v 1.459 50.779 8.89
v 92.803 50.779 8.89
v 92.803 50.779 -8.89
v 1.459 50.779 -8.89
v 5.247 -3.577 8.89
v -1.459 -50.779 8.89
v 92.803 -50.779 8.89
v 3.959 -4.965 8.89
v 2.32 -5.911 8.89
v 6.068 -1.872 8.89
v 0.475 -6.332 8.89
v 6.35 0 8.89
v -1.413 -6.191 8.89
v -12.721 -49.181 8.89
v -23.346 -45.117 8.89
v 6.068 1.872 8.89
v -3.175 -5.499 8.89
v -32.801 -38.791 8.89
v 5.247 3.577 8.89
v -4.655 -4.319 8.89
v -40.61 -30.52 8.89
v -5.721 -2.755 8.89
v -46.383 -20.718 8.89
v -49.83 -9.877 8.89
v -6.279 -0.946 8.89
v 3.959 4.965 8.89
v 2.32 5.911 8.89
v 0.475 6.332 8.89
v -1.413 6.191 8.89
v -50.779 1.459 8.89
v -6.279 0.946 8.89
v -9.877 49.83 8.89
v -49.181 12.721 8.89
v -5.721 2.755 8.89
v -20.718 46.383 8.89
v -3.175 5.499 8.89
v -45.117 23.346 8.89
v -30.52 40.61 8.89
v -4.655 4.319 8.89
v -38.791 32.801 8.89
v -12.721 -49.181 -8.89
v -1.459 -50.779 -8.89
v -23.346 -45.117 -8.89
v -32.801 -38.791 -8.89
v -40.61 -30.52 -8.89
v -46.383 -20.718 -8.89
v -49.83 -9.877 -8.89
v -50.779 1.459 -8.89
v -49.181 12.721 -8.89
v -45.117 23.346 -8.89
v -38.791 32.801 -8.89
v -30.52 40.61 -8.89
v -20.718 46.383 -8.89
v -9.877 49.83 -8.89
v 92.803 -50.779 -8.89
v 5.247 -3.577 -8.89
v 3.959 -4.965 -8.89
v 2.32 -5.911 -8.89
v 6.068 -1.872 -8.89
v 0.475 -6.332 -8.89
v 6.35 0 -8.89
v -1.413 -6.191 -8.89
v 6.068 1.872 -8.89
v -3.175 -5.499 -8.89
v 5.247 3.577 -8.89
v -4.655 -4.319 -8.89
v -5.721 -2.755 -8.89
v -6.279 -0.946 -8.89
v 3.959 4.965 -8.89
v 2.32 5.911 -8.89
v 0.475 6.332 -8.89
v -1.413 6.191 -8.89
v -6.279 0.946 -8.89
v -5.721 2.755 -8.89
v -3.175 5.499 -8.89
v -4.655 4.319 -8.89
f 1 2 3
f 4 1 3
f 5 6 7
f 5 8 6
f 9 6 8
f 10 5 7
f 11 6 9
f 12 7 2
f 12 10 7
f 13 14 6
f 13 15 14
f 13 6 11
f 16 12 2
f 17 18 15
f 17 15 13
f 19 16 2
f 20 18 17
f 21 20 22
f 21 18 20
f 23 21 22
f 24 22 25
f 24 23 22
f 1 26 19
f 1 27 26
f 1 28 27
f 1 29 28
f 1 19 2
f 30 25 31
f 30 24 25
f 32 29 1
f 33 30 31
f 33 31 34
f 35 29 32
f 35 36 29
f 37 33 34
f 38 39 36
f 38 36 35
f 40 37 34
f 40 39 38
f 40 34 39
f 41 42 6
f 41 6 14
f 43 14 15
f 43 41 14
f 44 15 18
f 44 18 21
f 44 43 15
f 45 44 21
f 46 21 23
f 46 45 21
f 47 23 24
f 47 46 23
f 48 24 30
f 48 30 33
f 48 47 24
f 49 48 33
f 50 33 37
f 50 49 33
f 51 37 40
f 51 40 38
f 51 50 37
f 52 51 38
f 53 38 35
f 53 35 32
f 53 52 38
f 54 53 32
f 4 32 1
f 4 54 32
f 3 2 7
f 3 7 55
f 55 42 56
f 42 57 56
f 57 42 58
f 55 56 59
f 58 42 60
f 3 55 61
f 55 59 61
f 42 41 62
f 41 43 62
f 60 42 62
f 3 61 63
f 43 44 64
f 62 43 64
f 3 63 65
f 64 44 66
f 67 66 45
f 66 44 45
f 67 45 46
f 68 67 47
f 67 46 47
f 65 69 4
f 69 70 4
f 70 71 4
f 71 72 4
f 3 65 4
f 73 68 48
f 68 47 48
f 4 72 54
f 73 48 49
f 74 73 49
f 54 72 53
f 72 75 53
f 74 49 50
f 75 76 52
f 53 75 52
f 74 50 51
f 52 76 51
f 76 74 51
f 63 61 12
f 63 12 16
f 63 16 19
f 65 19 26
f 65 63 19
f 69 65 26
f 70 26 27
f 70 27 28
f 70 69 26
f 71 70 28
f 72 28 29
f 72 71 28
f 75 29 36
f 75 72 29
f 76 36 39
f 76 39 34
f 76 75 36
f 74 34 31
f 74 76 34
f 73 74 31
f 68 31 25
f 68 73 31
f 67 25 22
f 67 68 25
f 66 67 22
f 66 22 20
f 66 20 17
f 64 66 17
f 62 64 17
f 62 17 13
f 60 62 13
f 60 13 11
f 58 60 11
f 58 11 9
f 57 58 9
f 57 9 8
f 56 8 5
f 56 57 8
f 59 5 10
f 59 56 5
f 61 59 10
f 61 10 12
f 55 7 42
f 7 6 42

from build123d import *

# Parameters (mm, degrees)
BOSS_EXTRUDE1_DEPTH      = 8.89
BOSS_EXTRUDE1_DEPTH_BACK = 8.89
SKETCH1_R                = 6.35
SKETCH2_W                = 17.78
SKETCH2_H                = 101.558108624
BOSS_EXTRUDE2_DEPTH      = 76.2


with BuildPart() as part:
    # Sketch1 → Boss-Extrude1 (new, two sides: drawn at the far end of the back side and taken through both)
    with BuildSketch(Plane.XY.offset(-BOSS_EXTRUDE1_DEPTH_BACK)):
        with BuildLine():
            Line((1.458644289, 50.779054312), (16.603324728, 50.779054312))
            Line((16.603324728, 50.779054312), (16.603324728, -50.779054312))
            Line((16.603324728, -50.779054312), (-1.458644289, -50.779054312))
            ThreePointArc((-1.458644289, -50.779054312), (-50.779054312, 1.458644289), (1.458644289, 50.779054312))
        make_face()
        Circle(SKETCH1_R, mode=Mode.SUBTRACT)
    extrude(amount=BOSS_EXTRUDE1_DEPTH + BOSS_EXTRUDE1_DEPTH_BACK)

    # Sketch2 → Boss-Extrude2 (add)
    with BuildSketch(Plane(origin=(16.603324728, 0, 0), x_dir=(0, 0, -1), z_dir=(1, 0, 0))):
        Rectangle(SKETCH2_W, SKETCH2_H)
    extrude(amount=BOSS_EXTRUDE2_DEPTH)


solid = part.part
